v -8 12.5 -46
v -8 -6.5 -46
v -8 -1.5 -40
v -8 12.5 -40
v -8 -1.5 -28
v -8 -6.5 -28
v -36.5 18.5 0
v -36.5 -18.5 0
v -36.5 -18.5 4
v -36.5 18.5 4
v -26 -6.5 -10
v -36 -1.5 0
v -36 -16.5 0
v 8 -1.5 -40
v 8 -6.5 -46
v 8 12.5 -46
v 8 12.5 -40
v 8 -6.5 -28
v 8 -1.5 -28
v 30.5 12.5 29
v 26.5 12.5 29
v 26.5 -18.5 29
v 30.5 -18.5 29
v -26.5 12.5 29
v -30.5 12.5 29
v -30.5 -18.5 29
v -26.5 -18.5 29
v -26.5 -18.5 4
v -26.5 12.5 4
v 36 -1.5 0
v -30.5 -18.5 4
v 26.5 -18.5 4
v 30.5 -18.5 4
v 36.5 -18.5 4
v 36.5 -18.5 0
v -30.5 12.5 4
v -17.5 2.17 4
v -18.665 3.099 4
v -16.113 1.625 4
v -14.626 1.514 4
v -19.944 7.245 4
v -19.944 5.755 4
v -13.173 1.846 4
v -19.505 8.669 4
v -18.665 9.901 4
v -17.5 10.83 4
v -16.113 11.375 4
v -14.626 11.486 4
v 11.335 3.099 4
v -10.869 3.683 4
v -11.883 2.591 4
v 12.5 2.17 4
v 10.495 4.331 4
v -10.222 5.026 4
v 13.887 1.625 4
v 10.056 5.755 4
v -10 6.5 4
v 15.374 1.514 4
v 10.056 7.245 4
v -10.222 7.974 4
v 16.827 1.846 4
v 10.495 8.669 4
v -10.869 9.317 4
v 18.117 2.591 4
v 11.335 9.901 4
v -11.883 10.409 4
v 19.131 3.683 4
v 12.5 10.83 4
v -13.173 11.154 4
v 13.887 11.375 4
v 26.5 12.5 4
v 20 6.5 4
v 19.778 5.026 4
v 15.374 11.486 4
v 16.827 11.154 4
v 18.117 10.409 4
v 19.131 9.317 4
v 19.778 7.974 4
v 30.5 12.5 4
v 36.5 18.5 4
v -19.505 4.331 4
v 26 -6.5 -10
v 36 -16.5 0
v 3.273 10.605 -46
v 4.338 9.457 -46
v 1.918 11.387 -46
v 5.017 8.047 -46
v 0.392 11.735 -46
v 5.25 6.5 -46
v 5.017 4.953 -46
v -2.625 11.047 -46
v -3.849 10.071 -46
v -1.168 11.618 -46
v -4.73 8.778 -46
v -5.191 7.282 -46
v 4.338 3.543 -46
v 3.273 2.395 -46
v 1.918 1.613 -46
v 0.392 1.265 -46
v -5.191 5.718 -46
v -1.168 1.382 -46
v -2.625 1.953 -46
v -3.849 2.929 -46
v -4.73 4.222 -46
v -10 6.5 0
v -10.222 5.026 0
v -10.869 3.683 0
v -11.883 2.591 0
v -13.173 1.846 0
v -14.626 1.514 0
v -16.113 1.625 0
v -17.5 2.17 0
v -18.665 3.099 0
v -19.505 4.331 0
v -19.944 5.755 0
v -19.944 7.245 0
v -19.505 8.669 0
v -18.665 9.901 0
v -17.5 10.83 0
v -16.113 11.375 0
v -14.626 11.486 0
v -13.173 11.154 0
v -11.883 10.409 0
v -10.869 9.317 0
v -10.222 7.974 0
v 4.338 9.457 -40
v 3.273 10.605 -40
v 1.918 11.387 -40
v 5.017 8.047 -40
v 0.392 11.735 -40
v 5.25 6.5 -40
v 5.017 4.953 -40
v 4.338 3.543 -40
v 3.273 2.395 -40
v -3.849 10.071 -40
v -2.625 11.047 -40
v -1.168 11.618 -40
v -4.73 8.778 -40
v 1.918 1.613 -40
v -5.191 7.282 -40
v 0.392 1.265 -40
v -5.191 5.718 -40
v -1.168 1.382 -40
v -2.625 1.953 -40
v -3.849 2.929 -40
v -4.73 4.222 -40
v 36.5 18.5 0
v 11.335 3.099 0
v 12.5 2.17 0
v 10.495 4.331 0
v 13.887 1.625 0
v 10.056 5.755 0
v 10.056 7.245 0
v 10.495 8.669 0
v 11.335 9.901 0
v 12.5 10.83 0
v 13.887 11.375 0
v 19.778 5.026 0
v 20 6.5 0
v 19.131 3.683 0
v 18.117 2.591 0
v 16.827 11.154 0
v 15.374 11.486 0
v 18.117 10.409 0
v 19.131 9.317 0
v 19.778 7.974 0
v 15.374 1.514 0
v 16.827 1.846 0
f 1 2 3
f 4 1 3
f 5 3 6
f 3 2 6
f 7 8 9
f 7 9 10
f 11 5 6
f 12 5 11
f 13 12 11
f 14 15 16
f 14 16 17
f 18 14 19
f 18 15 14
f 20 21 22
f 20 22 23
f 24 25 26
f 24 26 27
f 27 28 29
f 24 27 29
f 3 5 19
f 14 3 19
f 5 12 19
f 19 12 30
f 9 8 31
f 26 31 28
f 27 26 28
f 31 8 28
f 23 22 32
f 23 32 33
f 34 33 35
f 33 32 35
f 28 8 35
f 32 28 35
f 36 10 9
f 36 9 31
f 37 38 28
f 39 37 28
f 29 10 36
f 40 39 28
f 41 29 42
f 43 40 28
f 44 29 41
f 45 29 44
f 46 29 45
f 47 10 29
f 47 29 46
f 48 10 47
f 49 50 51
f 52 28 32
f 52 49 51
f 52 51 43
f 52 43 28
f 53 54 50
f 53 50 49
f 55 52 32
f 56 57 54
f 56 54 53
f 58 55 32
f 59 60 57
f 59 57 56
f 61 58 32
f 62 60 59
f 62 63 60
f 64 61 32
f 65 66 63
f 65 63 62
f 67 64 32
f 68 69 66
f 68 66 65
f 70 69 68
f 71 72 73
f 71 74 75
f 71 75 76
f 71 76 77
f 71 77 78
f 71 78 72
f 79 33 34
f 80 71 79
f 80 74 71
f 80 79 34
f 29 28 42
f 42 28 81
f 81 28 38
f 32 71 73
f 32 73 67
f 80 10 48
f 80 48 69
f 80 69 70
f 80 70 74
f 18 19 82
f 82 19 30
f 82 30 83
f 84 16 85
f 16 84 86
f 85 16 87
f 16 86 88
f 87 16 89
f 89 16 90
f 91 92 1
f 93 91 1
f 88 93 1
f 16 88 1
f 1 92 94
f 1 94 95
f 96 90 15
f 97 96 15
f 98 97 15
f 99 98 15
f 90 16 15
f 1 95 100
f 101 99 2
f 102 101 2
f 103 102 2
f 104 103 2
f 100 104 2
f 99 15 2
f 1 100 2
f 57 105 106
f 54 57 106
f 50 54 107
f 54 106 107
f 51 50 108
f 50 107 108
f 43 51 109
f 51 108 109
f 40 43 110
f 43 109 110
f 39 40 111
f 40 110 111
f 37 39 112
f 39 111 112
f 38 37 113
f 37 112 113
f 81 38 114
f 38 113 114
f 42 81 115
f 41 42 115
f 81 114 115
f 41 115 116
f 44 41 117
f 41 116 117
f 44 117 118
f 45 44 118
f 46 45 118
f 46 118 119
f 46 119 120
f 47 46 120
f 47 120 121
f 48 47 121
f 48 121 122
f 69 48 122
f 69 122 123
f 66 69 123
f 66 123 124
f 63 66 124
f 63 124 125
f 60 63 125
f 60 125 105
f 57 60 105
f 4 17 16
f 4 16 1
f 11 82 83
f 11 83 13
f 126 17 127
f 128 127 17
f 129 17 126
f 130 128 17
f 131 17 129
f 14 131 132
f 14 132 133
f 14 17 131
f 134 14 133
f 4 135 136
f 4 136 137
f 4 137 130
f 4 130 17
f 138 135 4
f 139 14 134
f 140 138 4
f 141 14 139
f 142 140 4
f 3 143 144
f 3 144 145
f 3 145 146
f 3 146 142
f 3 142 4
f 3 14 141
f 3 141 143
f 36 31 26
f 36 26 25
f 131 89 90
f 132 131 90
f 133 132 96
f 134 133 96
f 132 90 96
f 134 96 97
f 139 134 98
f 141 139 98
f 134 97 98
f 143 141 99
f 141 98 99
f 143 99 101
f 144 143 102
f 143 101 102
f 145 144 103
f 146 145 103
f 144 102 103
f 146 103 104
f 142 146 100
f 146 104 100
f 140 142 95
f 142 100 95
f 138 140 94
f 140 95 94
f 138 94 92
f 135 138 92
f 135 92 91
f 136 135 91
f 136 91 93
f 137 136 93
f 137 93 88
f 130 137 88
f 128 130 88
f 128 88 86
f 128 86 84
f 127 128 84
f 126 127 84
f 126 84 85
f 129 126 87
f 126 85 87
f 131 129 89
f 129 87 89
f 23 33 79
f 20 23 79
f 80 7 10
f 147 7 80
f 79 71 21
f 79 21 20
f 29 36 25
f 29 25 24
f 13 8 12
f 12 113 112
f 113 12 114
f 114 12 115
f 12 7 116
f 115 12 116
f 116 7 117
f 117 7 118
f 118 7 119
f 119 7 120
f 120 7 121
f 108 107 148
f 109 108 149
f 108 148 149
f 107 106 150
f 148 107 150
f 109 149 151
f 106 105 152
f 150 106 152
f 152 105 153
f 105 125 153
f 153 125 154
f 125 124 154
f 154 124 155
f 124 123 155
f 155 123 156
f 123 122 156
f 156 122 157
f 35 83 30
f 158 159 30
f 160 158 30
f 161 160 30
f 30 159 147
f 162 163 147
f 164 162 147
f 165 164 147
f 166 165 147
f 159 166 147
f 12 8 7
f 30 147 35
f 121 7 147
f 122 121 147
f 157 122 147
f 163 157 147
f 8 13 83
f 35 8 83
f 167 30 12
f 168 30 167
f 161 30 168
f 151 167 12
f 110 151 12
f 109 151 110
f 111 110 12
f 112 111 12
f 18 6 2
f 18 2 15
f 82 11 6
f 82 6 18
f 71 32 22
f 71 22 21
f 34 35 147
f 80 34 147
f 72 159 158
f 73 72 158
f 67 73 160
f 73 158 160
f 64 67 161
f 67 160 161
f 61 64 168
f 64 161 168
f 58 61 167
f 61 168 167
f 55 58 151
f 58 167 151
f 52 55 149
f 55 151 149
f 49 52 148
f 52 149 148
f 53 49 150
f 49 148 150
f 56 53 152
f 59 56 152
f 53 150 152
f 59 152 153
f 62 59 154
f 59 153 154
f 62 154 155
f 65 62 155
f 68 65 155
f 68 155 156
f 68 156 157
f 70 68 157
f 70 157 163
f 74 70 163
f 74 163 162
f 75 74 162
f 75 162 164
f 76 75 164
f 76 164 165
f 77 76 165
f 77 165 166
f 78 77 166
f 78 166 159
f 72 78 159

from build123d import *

# Parameters (mm, degrees)
SKETCH_W        = 73
SKETCH_H        = 37
PAD_DEPTH       = 4
SKETCH001_W     = 4
SKETCH001_H     = 31
PAD001_DEPTH    = 25
SKETCH002_W     = 16
SKETCH002_H     = 5
PAD002_DEPTH    = 46
SKETCH003_W     = 16
SKETCH003_H     = 6
PAD003_DEPTH    = 14
SKETCH004_R     = 5.25
POCKET_DEPTH    = 6
CHAMFER_SIZE    = 28
CHAMFER001_SIZE = 28
CHAMFER002_SIZE = 10
SKETCH005_R     = 5
POCKET001_DEPTH = 5


with BuildPart() as part:
    # Sketch → Pad (new body)
    with BuildSketch(Plane.XY):
        Rectangle(SKETCH_W, SKETCH_H)
    extrude(amount=PAD_DEPTH)

    # Sketch001 (on Face6 of Pad) → Pad001 (join)
    with BuildSketch(Plane.XY.offset(4)):
        with Locations((-28.5, -3)):
            Rectangle(SKETCH001_W, SKETCH001_H)
        with Locations((28.5, -3)):
            Rectangle(SKETCH001_W, SKETCH001_H)
    extrude(amount=PAD001_DEPTH)

    # Sketch002 (on Face4 of Pad001) → Pad002 (join)
    with BuildSketch(Plane(origin=(0, 0, 0), x_dir=(1, 0, 0), z_dir=(0, 0, -1))):
        with Locations((0, 4)):
            Rectangle(SKETCH002_W, SKETCH002_H)
    extrude(amount=PAD002_DEPTH)

    # Sketch003 (on Face8 of Pad002) → Pad003 (join)
    with BuildSketch(Plane(origin=(0, -1.5, 0), x_dir=(-1, 0, 0), z_dir=(0, 1, 0))):
        with Locations((0, -43)):
            Rectangle(SKETCH003_W, SKETCH003_H)
    extrude(amount=PAD003_DEPTH)

    # Sketch004 (on Face25 of Pad003) → Pocket (cut)
    with BuildSketch(Plane(origin=(0, 0, -46), x_dir=(1, 0, 0), z_dir=(0, 0, -1))):
        with Locations((0, -6.5)):
            Circle(SKETCH004_R)
    extrude(amount=-POCKET_DEPTH, mode=Mode.SUBTRACT)

    # Chamfer
    chamfer_edges = [part.edges().sort_by_distance(p)[0] for p in [
        (8, -4, 0),
    ]]
    chamfer(chamfer_edges, length=CHAMFER_SIZE)

    # Chamfer001
    chamfer001_edges = [part.edges().sort_by_distance(p)[0] for p in [
        (-8, -4, 0),
    ]]
    chamfer(chamfer001_edges, length=CHAMFER001_SIZE)

    # Chamfer002
    chamfer002_edges = [part.edges().sort_by_distance(p)[0] for p in [
        (0, -6.5, 0),
    ]]
    chamfer(chamfer002_edges, length=CHAMFER002_SIZE)

    # Sketch005 (on Face1 of Chamfer002) → Pocket001 (cut)
    with BuildSketch(Plane(origin=(0, 0, 0), x_dir=(1, 0, 0), z_dir=(0, 0, -1))):
        with Locations((15, -6.5)):
            Circle(SKETCH005_R)
        with Locations((-15, -6.5)):
            Circle(SKETCH005_R)
    extrude(amount=-POCKET001_DEPTH, mode=Mode.SUBTRACT)


solid = part.part
